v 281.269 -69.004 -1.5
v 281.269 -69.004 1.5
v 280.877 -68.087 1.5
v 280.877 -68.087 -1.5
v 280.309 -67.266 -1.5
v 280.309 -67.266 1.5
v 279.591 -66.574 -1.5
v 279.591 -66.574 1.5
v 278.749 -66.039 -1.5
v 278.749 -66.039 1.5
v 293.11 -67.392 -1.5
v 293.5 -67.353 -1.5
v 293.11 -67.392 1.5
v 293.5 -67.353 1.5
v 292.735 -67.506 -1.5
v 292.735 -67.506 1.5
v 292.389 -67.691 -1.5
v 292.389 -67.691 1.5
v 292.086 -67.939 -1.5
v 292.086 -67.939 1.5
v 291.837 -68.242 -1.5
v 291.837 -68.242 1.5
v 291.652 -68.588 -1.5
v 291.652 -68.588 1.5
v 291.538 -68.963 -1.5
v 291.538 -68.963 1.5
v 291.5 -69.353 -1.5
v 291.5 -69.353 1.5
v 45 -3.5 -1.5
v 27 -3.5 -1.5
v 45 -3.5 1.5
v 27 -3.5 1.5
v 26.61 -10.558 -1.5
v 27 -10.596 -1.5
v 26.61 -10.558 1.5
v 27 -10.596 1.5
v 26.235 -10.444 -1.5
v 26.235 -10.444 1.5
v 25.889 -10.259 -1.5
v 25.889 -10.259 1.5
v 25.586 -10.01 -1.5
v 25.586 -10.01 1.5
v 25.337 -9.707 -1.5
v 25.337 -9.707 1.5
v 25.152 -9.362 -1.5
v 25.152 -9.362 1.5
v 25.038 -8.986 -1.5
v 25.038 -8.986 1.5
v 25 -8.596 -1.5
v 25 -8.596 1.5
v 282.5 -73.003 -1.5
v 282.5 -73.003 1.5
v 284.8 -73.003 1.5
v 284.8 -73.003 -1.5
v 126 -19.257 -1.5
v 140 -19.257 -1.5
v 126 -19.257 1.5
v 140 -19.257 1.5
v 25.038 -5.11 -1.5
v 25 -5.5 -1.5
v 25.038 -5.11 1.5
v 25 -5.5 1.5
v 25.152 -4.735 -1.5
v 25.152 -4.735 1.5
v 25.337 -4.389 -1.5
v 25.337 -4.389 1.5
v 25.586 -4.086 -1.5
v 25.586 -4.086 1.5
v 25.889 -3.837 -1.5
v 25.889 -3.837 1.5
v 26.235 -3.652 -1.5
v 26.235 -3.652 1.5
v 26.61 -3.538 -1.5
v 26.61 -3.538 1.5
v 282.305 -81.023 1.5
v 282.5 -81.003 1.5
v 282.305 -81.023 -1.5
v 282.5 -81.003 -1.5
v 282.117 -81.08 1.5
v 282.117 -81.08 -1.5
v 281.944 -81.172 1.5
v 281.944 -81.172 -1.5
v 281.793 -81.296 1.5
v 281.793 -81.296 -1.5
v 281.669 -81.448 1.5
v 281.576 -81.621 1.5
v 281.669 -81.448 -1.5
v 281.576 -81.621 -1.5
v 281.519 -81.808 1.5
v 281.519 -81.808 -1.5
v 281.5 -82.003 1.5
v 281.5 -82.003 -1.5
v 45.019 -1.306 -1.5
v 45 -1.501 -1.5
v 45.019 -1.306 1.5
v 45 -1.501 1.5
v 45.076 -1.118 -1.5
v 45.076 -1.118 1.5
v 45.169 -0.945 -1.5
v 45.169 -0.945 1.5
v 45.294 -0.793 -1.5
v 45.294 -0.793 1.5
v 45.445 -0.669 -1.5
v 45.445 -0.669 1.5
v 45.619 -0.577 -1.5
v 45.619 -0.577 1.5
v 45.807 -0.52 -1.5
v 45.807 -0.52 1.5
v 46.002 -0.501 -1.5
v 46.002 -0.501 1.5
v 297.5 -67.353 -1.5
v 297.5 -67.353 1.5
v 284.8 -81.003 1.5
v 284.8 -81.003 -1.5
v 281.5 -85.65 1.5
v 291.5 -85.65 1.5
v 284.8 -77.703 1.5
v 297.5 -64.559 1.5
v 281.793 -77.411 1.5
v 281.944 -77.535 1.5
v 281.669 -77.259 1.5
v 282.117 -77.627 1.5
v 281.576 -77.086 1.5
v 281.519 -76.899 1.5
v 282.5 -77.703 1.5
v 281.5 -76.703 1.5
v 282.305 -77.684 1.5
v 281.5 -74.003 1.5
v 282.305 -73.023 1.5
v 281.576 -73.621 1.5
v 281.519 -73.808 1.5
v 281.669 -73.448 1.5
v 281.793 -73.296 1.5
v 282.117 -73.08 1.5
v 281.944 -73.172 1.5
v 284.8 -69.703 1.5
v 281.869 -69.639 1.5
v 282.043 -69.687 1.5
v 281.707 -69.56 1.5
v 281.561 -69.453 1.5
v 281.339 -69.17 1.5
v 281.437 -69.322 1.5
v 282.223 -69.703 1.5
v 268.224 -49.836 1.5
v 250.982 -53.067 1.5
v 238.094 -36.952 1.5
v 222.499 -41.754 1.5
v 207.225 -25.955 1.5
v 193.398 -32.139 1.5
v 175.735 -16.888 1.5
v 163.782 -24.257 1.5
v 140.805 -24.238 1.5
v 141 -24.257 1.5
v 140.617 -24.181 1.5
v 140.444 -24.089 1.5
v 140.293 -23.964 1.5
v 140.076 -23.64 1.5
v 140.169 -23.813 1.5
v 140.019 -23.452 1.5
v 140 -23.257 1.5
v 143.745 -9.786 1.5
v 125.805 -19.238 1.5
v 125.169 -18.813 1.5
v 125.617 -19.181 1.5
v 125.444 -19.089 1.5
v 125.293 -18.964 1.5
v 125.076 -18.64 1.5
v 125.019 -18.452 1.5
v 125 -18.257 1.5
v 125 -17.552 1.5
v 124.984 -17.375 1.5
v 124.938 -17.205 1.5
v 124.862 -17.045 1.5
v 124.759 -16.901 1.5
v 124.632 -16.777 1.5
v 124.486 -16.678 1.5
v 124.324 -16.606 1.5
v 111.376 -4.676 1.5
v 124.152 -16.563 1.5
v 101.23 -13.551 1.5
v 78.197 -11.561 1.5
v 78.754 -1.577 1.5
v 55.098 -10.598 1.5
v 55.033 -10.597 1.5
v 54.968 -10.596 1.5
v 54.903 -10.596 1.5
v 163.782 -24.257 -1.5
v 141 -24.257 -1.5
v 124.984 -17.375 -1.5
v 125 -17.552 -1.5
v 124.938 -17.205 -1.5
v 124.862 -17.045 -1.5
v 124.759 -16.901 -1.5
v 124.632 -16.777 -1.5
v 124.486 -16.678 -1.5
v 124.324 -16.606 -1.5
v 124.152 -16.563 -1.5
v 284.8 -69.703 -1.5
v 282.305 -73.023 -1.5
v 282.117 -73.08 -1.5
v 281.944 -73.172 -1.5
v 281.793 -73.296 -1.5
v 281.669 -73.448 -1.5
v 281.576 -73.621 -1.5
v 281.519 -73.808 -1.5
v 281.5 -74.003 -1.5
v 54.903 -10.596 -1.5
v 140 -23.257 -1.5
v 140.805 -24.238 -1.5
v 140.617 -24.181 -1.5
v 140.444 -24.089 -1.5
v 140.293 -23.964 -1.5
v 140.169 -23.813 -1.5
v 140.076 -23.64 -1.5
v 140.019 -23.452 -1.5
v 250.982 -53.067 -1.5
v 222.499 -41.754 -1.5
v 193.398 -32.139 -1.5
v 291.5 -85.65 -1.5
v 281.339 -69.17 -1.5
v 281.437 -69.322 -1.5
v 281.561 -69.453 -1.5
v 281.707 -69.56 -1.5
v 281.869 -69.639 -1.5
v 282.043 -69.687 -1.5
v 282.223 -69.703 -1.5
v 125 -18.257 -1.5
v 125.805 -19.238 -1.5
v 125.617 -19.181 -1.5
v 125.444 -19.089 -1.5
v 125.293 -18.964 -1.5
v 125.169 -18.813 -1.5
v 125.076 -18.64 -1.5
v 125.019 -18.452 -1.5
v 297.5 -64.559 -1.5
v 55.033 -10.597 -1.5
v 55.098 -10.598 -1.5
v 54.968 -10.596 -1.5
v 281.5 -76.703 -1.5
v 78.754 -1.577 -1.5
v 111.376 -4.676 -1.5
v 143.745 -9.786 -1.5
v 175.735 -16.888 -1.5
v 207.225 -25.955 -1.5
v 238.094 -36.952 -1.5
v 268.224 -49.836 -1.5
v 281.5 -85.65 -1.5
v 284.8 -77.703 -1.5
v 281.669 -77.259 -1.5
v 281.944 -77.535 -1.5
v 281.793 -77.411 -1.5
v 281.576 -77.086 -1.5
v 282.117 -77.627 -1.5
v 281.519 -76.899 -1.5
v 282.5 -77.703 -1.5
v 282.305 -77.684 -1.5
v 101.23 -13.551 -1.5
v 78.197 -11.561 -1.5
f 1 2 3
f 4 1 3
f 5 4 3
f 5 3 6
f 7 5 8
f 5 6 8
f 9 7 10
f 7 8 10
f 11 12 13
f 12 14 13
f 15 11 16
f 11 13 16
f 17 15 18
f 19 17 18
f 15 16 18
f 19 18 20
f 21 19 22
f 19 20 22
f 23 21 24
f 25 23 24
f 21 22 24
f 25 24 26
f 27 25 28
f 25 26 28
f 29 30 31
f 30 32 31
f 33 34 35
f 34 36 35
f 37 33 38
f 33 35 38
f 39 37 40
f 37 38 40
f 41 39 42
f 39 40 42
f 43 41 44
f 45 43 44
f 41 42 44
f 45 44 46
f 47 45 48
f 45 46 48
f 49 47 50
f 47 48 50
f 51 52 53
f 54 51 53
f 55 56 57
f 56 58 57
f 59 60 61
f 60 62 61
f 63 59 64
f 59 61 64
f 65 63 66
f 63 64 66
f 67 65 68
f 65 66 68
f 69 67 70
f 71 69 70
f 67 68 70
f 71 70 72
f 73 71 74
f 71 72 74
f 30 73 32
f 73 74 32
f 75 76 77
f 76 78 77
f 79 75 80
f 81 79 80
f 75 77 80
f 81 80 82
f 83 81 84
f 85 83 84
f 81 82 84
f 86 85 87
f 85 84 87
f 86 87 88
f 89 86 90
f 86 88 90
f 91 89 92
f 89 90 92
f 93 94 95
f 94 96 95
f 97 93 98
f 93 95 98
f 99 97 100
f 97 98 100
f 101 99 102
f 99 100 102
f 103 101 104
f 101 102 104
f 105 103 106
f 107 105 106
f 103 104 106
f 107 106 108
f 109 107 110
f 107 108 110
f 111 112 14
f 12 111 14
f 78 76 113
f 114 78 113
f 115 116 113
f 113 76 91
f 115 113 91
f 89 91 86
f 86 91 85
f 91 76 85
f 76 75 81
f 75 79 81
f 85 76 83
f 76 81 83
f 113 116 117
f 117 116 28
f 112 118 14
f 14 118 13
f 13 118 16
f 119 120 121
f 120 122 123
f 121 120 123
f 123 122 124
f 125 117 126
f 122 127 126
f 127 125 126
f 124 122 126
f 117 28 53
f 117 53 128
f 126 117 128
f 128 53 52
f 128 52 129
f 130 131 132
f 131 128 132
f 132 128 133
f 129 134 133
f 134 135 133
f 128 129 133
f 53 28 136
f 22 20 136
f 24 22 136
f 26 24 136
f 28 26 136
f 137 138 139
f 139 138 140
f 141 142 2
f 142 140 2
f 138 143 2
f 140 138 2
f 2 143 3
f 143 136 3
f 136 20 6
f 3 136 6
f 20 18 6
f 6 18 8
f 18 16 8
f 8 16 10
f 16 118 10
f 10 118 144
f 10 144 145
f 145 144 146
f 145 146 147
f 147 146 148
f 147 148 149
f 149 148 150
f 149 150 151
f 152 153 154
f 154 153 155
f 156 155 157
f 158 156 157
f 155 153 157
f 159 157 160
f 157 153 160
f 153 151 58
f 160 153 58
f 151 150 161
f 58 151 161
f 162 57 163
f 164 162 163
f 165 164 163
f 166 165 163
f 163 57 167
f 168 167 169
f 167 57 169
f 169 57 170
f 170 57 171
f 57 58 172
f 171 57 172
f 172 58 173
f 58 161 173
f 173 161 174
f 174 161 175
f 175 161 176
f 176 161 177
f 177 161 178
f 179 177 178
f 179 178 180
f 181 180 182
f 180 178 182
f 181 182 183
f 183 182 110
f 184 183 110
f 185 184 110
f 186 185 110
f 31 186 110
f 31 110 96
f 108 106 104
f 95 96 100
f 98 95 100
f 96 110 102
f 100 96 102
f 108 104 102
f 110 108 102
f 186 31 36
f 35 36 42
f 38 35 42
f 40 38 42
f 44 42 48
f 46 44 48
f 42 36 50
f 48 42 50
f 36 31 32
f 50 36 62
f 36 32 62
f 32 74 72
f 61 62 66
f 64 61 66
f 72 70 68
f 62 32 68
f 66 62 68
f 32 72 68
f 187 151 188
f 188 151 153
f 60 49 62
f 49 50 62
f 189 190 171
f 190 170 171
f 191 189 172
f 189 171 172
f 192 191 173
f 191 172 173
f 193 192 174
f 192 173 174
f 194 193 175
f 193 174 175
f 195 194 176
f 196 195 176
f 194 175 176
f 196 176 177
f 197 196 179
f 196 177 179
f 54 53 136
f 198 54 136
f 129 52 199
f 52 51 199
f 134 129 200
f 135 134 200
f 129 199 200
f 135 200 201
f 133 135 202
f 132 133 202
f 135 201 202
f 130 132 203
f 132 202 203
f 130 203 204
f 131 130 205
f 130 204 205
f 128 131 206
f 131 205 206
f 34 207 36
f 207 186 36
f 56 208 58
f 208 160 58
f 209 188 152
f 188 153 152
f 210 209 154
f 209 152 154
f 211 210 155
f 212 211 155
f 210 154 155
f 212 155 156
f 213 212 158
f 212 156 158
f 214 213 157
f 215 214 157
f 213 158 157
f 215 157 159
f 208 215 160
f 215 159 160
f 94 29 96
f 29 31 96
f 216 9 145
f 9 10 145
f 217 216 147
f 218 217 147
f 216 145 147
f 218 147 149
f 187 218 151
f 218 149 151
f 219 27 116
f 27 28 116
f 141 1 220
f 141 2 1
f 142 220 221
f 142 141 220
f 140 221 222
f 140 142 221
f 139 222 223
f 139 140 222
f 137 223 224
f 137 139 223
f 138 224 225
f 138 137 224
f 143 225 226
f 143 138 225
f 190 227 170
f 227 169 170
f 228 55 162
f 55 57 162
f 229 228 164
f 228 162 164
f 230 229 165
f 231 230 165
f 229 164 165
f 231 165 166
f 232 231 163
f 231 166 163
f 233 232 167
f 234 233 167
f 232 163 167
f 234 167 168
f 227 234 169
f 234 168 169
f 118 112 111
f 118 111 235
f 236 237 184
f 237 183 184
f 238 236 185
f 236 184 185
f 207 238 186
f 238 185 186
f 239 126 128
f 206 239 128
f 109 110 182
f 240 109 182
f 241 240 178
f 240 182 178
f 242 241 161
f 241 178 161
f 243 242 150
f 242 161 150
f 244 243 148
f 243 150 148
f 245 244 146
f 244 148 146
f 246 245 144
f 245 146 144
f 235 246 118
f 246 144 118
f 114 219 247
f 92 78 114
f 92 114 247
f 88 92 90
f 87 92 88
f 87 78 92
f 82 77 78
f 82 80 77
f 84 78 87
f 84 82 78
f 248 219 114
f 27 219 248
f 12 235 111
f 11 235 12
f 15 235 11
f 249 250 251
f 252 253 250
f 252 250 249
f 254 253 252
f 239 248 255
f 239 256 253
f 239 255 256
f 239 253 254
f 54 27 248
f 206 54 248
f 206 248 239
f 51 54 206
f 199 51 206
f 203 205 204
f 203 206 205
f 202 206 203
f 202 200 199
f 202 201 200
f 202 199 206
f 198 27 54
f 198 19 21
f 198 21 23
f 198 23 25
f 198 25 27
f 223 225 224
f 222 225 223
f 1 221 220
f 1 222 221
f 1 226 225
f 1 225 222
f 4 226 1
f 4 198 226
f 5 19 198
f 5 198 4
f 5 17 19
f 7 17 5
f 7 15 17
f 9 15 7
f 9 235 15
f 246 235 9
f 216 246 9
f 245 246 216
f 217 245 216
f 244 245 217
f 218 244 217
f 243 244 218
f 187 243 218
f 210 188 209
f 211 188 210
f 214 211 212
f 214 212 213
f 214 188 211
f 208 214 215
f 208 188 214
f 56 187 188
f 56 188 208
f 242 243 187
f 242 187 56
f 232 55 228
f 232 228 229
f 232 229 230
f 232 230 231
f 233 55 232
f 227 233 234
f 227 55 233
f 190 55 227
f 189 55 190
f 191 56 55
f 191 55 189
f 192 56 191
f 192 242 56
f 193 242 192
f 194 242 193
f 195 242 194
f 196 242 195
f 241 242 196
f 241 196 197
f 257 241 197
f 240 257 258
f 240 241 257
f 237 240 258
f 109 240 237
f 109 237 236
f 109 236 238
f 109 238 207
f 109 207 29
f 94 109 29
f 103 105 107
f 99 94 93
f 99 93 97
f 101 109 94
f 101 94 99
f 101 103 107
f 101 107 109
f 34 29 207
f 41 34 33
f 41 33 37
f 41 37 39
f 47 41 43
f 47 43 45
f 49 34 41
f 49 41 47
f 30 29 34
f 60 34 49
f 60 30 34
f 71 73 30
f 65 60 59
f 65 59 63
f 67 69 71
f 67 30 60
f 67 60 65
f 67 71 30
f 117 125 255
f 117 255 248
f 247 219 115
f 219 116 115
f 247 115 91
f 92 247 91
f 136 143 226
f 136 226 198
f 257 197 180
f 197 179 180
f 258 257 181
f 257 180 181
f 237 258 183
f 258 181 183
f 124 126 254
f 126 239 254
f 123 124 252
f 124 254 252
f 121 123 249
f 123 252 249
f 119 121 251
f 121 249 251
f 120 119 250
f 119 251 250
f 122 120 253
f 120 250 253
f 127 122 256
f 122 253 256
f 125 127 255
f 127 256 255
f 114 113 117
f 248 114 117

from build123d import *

# Parameters (mm, degrees)
BOSS_EXTRUDE1_DEPTH = 1.5
SKETCH3_W           = 4.820379215
SKETCH3_H           = 3.3
CUT_EXTRUDE1_DEPTH  = 10
FILLET1_R           = 1
SKETCH4_W           = 2
SKETCH4_H           = 7.019019915
CUT_EXTRUDE2_DEPTH  = 10


with BuildPart() as part:
    # Sketch2 → Boss-Extrude1 (new, symmetric)
    with BuildSketch(Plane.XY):
        with BuildLine():
            Line((299.5, -67.353443934), (293.5, -67.353443934))
            ThreePointArc((293.5, -67.353443934), (292.085786438, -67.939230372), (291.5, -69.353443934))
            Line((291.5, -69.353443934), (291.5, -85.649534053))
            Line((291.5, -85.649534053), (281.5, -85.649534053))
            Line((281.5, -85.649534053), (281.5, -70.504592149))
            ThreePointArc((281.5, -70.504592149), (280.757064897, -67.882112699), (278.749040614, -66.038966065))
            ThreePointArc((278.749040614, -66.038966065), (222.498981863, -41.753539728), (163.781589842, -24.257285386))
            Line((163.781589842, -24.257285386), (141, -24.257285386))
            ThreePointArc((141, -24.257285386), (140.292893219, -23.964392167), (140, -23.257285386))
            Line((140, -23.257285386), (140, -19.257285386))
            Line((140, -19.257285386), (126, -19.257285386))
            ThreePointArc((126, -19.257285386), (125.292893219, -18.964392167), (125, -18.257285386))
            Line((125, -18.257285386), (125, -17.551725847))
            ThreePointArc((125, -17.551725847), (124.759050209, -16.900693759), (124.152314439, -16.563393762))
            ThreePointArc((124.152314439, -16.563393762), (89.724531973, -12.428170907), (55.097618142, -10.598112953))
            ThreePointArc((55.097618142, -10.598112953), (55.000467449, -10.596696958), (54.903307584, -10.596224945))
            Line((54.903307584, -10.596224945), (27, -10.596224945))
            ThreePointArc((27, -10.596224945), (25.585786438, -10.010438507), (25, -8.596224945))
            Line((25, -8.596224945), (25, -5.5))
            ThreePointArc((25, -5.5), (25.585786438, -4.085786438), (27, -3.5))
            Line((27, -3.5), (45, -3.5))
            Line((45, -3.5), (45, -1.500945781))
            ThreePointArc((45, -1.500945781), (45.293562303, -0.793170548), (46.001891561, -0.50094757))
            ThreePointArc((46.001891561, -0.50094757), (176.838494864, -17.170276226), (299.5, -65.649534053))
            Line((299.5, -65.649534053), (299.5, -67.353443934))
        make_face()
    extrude(amount=BOSS_EXTRUDE1_DEPTH, both=True)

    # Sketch3 → Cut-Extrude1 (cut)
    with BuildSketch(Plane.XY.offset(1.5)):
        with Locations((282.389810393, -71.353443934)):
            Rectangle(SKETCH3_W, SKETCH3_H)
        with Locations((282.389810393, -79.353443934)):
            Rectangle(SKETCH3_W, SKETCH3_H)
    extrude(amount=-CUT_EXTRUDE1_DEPTH, mode=Mode.SUBTRACT)

    # Fillet1
    fillet1_edges = [part.edges().sort_by_distance(p)[0] for p in [
        (281.435398823, -69.703443934, 0),
        (281.5, -73.003443934, 0),
        (281.5, -81.003443934, 0),
        (281.5, -77.703443934, 0),
    ]]
    fillet(fillet1_edges, radius=FILLET1_R)

    # Sketch4 → Cut-Extrude2 (cut)
    with BuildSketch(Plane.XY.offset(1.5)):
        with Locations((298.5, -66.105228371)):
            Rectangle(SKETCH4_W, SKETCH4_H)
    extrude(amount=-CUT_EXTRUDE2_DEPTH, mode=Mode.SUBTRACT)


solid = part.part
